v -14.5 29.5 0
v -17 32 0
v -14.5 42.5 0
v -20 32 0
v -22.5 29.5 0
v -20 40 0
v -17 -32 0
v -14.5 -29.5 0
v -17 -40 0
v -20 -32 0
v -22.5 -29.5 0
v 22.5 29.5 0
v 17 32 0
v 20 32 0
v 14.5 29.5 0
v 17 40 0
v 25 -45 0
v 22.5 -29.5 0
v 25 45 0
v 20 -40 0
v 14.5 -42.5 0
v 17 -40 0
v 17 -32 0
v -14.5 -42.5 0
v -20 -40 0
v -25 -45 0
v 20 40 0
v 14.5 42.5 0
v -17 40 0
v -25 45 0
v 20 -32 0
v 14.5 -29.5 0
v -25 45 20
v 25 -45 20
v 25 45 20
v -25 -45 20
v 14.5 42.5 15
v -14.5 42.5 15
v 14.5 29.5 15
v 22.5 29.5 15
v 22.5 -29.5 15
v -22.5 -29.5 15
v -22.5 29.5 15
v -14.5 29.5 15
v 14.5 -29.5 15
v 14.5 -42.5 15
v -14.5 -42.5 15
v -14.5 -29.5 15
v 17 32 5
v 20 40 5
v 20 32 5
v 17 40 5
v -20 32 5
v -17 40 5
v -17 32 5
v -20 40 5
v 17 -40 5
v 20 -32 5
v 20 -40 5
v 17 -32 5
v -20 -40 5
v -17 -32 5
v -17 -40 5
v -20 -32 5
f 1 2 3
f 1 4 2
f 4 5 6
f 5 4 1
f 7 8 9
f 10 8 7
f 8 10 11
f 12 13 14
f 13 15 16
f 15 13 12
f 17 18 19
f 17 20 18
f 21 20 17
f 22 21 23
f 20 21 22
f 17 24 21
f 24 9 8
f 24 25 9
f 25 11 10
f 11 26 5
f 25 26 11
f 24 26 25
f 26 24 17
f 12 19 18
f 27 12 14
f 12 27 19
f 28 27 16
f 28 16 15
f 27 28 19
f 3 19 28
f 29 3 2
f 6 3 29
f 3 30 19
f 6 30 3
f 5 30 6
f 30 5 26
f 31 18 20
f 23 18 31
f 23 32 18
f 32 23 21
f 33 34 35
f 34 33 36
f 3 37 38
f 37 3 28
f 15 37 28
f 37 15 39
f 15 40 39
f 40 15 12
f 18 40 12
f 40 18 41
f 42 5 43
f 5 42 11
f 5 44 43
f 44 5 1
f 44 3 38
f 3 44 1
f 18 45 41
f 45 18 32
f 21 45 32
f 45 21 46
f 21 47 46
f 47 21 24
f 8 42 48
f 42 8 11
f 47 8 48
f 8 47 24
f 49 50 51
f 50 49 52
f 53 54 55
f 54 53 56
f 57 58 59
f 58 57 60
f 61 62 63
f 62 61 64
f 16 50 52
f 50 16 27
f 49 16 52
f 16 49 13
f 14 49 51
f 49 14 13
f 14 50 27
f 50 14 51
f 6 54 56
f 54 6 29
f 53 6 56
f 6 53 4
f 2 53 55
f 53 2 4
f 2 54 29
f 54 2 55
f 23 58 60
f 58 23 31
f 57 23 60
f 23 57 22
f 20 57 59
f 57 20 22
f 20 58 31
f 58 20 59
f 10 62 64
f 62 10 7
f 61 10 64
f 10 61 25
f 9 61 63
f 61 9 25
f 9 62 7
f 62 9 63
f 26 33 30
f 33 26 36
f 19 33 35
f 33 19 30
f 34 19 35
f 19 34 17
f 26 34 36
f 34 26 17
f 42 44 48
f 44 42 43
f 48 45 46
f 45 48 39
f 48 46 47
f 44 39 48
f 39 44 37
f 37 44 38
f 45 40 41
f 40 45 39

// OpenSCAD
// Custom Thermostat Housing

wall_mount_len=90;
wall_mount_wid=50;
wall_mount_dep=20;
wall_mount_thick=5;
wall_mount_inside_scale_x=1-(wall_mount_thick/wall_mount_wid);
wall_mount_inside_scale_y=1-(wall_mount_thick/wall_mount_len);
wall_mount_inside_scale_z=1-(wall_mount_thick/wall_mount_dep);


mount_hole_len=8;
mount_hole_wid=3;
mount_hole_dep=5;
mount_holes_dist_inner_vert=80;
mount_holes_dist_inner_hor=40;

module wantRect(l, w) {
    translate([-w/2,-l/2,0])
        square([w, l]);
}

module wantCirc(s) {
    circle(d=s,$fn=60);
}

module mountBody2D() {
    wantRect(wall_mount_len, wall_mount_wid);
}

x=mount_holes_dist_inner_hor/2-mount_hole_wid/2;
y=mount_holes_dist_inner_vert/2-mount_hole_len/2;
module mountHoles2D() {
    translate([x, y])
        wantRect(mount_hole_len, mount_hole_wid);
    translate([-x, y])
        wantRect(mount_hole_len, mount_hole_wid);
    translate([x, -y])
        wantRect(mount_hole_len, mount_hole_wid);
    translate([-x, -y])
        wantRect(mount_hole_len, mount_hole_wid);
}

module mountHoleSupports2D() {
    l=mount_hole_len+wall_mount_thick;
    w=mount_hole_wid+wall_mount_thick;
    
    translate([x, y])
        wantRect(l, w);
    translate([-x, y])
        wantRect(l, w);
    translate([x, -y])
        wantRect(l, w);
    translate([-x, -y])
        wantRect(l, w);
}

module mountHolesSupported3D() {
    difference() {
        linear_extrude(wall_mount_dep)
            mountHoleSupports2D();
        linear_extrude(mount_hole_dep)
            mountHoles2D();    
    }
}

module wallMountBody3D() {
    difference() {
    linear_extrude(wall_mount_dep) 
        mountBody2D();
    scale([wall_mount_inside_scale_x,wall_mount_inside_scale_y])
    linear_extrude(wall_mount_dep*wall_mount_inside_scale_z)
        mountBody2D();
    }
}

module wallMount3D() {
    union() {
    mountHolesSupported3D();
    wallMountBody3D();
    }
}

wallMount3D();
